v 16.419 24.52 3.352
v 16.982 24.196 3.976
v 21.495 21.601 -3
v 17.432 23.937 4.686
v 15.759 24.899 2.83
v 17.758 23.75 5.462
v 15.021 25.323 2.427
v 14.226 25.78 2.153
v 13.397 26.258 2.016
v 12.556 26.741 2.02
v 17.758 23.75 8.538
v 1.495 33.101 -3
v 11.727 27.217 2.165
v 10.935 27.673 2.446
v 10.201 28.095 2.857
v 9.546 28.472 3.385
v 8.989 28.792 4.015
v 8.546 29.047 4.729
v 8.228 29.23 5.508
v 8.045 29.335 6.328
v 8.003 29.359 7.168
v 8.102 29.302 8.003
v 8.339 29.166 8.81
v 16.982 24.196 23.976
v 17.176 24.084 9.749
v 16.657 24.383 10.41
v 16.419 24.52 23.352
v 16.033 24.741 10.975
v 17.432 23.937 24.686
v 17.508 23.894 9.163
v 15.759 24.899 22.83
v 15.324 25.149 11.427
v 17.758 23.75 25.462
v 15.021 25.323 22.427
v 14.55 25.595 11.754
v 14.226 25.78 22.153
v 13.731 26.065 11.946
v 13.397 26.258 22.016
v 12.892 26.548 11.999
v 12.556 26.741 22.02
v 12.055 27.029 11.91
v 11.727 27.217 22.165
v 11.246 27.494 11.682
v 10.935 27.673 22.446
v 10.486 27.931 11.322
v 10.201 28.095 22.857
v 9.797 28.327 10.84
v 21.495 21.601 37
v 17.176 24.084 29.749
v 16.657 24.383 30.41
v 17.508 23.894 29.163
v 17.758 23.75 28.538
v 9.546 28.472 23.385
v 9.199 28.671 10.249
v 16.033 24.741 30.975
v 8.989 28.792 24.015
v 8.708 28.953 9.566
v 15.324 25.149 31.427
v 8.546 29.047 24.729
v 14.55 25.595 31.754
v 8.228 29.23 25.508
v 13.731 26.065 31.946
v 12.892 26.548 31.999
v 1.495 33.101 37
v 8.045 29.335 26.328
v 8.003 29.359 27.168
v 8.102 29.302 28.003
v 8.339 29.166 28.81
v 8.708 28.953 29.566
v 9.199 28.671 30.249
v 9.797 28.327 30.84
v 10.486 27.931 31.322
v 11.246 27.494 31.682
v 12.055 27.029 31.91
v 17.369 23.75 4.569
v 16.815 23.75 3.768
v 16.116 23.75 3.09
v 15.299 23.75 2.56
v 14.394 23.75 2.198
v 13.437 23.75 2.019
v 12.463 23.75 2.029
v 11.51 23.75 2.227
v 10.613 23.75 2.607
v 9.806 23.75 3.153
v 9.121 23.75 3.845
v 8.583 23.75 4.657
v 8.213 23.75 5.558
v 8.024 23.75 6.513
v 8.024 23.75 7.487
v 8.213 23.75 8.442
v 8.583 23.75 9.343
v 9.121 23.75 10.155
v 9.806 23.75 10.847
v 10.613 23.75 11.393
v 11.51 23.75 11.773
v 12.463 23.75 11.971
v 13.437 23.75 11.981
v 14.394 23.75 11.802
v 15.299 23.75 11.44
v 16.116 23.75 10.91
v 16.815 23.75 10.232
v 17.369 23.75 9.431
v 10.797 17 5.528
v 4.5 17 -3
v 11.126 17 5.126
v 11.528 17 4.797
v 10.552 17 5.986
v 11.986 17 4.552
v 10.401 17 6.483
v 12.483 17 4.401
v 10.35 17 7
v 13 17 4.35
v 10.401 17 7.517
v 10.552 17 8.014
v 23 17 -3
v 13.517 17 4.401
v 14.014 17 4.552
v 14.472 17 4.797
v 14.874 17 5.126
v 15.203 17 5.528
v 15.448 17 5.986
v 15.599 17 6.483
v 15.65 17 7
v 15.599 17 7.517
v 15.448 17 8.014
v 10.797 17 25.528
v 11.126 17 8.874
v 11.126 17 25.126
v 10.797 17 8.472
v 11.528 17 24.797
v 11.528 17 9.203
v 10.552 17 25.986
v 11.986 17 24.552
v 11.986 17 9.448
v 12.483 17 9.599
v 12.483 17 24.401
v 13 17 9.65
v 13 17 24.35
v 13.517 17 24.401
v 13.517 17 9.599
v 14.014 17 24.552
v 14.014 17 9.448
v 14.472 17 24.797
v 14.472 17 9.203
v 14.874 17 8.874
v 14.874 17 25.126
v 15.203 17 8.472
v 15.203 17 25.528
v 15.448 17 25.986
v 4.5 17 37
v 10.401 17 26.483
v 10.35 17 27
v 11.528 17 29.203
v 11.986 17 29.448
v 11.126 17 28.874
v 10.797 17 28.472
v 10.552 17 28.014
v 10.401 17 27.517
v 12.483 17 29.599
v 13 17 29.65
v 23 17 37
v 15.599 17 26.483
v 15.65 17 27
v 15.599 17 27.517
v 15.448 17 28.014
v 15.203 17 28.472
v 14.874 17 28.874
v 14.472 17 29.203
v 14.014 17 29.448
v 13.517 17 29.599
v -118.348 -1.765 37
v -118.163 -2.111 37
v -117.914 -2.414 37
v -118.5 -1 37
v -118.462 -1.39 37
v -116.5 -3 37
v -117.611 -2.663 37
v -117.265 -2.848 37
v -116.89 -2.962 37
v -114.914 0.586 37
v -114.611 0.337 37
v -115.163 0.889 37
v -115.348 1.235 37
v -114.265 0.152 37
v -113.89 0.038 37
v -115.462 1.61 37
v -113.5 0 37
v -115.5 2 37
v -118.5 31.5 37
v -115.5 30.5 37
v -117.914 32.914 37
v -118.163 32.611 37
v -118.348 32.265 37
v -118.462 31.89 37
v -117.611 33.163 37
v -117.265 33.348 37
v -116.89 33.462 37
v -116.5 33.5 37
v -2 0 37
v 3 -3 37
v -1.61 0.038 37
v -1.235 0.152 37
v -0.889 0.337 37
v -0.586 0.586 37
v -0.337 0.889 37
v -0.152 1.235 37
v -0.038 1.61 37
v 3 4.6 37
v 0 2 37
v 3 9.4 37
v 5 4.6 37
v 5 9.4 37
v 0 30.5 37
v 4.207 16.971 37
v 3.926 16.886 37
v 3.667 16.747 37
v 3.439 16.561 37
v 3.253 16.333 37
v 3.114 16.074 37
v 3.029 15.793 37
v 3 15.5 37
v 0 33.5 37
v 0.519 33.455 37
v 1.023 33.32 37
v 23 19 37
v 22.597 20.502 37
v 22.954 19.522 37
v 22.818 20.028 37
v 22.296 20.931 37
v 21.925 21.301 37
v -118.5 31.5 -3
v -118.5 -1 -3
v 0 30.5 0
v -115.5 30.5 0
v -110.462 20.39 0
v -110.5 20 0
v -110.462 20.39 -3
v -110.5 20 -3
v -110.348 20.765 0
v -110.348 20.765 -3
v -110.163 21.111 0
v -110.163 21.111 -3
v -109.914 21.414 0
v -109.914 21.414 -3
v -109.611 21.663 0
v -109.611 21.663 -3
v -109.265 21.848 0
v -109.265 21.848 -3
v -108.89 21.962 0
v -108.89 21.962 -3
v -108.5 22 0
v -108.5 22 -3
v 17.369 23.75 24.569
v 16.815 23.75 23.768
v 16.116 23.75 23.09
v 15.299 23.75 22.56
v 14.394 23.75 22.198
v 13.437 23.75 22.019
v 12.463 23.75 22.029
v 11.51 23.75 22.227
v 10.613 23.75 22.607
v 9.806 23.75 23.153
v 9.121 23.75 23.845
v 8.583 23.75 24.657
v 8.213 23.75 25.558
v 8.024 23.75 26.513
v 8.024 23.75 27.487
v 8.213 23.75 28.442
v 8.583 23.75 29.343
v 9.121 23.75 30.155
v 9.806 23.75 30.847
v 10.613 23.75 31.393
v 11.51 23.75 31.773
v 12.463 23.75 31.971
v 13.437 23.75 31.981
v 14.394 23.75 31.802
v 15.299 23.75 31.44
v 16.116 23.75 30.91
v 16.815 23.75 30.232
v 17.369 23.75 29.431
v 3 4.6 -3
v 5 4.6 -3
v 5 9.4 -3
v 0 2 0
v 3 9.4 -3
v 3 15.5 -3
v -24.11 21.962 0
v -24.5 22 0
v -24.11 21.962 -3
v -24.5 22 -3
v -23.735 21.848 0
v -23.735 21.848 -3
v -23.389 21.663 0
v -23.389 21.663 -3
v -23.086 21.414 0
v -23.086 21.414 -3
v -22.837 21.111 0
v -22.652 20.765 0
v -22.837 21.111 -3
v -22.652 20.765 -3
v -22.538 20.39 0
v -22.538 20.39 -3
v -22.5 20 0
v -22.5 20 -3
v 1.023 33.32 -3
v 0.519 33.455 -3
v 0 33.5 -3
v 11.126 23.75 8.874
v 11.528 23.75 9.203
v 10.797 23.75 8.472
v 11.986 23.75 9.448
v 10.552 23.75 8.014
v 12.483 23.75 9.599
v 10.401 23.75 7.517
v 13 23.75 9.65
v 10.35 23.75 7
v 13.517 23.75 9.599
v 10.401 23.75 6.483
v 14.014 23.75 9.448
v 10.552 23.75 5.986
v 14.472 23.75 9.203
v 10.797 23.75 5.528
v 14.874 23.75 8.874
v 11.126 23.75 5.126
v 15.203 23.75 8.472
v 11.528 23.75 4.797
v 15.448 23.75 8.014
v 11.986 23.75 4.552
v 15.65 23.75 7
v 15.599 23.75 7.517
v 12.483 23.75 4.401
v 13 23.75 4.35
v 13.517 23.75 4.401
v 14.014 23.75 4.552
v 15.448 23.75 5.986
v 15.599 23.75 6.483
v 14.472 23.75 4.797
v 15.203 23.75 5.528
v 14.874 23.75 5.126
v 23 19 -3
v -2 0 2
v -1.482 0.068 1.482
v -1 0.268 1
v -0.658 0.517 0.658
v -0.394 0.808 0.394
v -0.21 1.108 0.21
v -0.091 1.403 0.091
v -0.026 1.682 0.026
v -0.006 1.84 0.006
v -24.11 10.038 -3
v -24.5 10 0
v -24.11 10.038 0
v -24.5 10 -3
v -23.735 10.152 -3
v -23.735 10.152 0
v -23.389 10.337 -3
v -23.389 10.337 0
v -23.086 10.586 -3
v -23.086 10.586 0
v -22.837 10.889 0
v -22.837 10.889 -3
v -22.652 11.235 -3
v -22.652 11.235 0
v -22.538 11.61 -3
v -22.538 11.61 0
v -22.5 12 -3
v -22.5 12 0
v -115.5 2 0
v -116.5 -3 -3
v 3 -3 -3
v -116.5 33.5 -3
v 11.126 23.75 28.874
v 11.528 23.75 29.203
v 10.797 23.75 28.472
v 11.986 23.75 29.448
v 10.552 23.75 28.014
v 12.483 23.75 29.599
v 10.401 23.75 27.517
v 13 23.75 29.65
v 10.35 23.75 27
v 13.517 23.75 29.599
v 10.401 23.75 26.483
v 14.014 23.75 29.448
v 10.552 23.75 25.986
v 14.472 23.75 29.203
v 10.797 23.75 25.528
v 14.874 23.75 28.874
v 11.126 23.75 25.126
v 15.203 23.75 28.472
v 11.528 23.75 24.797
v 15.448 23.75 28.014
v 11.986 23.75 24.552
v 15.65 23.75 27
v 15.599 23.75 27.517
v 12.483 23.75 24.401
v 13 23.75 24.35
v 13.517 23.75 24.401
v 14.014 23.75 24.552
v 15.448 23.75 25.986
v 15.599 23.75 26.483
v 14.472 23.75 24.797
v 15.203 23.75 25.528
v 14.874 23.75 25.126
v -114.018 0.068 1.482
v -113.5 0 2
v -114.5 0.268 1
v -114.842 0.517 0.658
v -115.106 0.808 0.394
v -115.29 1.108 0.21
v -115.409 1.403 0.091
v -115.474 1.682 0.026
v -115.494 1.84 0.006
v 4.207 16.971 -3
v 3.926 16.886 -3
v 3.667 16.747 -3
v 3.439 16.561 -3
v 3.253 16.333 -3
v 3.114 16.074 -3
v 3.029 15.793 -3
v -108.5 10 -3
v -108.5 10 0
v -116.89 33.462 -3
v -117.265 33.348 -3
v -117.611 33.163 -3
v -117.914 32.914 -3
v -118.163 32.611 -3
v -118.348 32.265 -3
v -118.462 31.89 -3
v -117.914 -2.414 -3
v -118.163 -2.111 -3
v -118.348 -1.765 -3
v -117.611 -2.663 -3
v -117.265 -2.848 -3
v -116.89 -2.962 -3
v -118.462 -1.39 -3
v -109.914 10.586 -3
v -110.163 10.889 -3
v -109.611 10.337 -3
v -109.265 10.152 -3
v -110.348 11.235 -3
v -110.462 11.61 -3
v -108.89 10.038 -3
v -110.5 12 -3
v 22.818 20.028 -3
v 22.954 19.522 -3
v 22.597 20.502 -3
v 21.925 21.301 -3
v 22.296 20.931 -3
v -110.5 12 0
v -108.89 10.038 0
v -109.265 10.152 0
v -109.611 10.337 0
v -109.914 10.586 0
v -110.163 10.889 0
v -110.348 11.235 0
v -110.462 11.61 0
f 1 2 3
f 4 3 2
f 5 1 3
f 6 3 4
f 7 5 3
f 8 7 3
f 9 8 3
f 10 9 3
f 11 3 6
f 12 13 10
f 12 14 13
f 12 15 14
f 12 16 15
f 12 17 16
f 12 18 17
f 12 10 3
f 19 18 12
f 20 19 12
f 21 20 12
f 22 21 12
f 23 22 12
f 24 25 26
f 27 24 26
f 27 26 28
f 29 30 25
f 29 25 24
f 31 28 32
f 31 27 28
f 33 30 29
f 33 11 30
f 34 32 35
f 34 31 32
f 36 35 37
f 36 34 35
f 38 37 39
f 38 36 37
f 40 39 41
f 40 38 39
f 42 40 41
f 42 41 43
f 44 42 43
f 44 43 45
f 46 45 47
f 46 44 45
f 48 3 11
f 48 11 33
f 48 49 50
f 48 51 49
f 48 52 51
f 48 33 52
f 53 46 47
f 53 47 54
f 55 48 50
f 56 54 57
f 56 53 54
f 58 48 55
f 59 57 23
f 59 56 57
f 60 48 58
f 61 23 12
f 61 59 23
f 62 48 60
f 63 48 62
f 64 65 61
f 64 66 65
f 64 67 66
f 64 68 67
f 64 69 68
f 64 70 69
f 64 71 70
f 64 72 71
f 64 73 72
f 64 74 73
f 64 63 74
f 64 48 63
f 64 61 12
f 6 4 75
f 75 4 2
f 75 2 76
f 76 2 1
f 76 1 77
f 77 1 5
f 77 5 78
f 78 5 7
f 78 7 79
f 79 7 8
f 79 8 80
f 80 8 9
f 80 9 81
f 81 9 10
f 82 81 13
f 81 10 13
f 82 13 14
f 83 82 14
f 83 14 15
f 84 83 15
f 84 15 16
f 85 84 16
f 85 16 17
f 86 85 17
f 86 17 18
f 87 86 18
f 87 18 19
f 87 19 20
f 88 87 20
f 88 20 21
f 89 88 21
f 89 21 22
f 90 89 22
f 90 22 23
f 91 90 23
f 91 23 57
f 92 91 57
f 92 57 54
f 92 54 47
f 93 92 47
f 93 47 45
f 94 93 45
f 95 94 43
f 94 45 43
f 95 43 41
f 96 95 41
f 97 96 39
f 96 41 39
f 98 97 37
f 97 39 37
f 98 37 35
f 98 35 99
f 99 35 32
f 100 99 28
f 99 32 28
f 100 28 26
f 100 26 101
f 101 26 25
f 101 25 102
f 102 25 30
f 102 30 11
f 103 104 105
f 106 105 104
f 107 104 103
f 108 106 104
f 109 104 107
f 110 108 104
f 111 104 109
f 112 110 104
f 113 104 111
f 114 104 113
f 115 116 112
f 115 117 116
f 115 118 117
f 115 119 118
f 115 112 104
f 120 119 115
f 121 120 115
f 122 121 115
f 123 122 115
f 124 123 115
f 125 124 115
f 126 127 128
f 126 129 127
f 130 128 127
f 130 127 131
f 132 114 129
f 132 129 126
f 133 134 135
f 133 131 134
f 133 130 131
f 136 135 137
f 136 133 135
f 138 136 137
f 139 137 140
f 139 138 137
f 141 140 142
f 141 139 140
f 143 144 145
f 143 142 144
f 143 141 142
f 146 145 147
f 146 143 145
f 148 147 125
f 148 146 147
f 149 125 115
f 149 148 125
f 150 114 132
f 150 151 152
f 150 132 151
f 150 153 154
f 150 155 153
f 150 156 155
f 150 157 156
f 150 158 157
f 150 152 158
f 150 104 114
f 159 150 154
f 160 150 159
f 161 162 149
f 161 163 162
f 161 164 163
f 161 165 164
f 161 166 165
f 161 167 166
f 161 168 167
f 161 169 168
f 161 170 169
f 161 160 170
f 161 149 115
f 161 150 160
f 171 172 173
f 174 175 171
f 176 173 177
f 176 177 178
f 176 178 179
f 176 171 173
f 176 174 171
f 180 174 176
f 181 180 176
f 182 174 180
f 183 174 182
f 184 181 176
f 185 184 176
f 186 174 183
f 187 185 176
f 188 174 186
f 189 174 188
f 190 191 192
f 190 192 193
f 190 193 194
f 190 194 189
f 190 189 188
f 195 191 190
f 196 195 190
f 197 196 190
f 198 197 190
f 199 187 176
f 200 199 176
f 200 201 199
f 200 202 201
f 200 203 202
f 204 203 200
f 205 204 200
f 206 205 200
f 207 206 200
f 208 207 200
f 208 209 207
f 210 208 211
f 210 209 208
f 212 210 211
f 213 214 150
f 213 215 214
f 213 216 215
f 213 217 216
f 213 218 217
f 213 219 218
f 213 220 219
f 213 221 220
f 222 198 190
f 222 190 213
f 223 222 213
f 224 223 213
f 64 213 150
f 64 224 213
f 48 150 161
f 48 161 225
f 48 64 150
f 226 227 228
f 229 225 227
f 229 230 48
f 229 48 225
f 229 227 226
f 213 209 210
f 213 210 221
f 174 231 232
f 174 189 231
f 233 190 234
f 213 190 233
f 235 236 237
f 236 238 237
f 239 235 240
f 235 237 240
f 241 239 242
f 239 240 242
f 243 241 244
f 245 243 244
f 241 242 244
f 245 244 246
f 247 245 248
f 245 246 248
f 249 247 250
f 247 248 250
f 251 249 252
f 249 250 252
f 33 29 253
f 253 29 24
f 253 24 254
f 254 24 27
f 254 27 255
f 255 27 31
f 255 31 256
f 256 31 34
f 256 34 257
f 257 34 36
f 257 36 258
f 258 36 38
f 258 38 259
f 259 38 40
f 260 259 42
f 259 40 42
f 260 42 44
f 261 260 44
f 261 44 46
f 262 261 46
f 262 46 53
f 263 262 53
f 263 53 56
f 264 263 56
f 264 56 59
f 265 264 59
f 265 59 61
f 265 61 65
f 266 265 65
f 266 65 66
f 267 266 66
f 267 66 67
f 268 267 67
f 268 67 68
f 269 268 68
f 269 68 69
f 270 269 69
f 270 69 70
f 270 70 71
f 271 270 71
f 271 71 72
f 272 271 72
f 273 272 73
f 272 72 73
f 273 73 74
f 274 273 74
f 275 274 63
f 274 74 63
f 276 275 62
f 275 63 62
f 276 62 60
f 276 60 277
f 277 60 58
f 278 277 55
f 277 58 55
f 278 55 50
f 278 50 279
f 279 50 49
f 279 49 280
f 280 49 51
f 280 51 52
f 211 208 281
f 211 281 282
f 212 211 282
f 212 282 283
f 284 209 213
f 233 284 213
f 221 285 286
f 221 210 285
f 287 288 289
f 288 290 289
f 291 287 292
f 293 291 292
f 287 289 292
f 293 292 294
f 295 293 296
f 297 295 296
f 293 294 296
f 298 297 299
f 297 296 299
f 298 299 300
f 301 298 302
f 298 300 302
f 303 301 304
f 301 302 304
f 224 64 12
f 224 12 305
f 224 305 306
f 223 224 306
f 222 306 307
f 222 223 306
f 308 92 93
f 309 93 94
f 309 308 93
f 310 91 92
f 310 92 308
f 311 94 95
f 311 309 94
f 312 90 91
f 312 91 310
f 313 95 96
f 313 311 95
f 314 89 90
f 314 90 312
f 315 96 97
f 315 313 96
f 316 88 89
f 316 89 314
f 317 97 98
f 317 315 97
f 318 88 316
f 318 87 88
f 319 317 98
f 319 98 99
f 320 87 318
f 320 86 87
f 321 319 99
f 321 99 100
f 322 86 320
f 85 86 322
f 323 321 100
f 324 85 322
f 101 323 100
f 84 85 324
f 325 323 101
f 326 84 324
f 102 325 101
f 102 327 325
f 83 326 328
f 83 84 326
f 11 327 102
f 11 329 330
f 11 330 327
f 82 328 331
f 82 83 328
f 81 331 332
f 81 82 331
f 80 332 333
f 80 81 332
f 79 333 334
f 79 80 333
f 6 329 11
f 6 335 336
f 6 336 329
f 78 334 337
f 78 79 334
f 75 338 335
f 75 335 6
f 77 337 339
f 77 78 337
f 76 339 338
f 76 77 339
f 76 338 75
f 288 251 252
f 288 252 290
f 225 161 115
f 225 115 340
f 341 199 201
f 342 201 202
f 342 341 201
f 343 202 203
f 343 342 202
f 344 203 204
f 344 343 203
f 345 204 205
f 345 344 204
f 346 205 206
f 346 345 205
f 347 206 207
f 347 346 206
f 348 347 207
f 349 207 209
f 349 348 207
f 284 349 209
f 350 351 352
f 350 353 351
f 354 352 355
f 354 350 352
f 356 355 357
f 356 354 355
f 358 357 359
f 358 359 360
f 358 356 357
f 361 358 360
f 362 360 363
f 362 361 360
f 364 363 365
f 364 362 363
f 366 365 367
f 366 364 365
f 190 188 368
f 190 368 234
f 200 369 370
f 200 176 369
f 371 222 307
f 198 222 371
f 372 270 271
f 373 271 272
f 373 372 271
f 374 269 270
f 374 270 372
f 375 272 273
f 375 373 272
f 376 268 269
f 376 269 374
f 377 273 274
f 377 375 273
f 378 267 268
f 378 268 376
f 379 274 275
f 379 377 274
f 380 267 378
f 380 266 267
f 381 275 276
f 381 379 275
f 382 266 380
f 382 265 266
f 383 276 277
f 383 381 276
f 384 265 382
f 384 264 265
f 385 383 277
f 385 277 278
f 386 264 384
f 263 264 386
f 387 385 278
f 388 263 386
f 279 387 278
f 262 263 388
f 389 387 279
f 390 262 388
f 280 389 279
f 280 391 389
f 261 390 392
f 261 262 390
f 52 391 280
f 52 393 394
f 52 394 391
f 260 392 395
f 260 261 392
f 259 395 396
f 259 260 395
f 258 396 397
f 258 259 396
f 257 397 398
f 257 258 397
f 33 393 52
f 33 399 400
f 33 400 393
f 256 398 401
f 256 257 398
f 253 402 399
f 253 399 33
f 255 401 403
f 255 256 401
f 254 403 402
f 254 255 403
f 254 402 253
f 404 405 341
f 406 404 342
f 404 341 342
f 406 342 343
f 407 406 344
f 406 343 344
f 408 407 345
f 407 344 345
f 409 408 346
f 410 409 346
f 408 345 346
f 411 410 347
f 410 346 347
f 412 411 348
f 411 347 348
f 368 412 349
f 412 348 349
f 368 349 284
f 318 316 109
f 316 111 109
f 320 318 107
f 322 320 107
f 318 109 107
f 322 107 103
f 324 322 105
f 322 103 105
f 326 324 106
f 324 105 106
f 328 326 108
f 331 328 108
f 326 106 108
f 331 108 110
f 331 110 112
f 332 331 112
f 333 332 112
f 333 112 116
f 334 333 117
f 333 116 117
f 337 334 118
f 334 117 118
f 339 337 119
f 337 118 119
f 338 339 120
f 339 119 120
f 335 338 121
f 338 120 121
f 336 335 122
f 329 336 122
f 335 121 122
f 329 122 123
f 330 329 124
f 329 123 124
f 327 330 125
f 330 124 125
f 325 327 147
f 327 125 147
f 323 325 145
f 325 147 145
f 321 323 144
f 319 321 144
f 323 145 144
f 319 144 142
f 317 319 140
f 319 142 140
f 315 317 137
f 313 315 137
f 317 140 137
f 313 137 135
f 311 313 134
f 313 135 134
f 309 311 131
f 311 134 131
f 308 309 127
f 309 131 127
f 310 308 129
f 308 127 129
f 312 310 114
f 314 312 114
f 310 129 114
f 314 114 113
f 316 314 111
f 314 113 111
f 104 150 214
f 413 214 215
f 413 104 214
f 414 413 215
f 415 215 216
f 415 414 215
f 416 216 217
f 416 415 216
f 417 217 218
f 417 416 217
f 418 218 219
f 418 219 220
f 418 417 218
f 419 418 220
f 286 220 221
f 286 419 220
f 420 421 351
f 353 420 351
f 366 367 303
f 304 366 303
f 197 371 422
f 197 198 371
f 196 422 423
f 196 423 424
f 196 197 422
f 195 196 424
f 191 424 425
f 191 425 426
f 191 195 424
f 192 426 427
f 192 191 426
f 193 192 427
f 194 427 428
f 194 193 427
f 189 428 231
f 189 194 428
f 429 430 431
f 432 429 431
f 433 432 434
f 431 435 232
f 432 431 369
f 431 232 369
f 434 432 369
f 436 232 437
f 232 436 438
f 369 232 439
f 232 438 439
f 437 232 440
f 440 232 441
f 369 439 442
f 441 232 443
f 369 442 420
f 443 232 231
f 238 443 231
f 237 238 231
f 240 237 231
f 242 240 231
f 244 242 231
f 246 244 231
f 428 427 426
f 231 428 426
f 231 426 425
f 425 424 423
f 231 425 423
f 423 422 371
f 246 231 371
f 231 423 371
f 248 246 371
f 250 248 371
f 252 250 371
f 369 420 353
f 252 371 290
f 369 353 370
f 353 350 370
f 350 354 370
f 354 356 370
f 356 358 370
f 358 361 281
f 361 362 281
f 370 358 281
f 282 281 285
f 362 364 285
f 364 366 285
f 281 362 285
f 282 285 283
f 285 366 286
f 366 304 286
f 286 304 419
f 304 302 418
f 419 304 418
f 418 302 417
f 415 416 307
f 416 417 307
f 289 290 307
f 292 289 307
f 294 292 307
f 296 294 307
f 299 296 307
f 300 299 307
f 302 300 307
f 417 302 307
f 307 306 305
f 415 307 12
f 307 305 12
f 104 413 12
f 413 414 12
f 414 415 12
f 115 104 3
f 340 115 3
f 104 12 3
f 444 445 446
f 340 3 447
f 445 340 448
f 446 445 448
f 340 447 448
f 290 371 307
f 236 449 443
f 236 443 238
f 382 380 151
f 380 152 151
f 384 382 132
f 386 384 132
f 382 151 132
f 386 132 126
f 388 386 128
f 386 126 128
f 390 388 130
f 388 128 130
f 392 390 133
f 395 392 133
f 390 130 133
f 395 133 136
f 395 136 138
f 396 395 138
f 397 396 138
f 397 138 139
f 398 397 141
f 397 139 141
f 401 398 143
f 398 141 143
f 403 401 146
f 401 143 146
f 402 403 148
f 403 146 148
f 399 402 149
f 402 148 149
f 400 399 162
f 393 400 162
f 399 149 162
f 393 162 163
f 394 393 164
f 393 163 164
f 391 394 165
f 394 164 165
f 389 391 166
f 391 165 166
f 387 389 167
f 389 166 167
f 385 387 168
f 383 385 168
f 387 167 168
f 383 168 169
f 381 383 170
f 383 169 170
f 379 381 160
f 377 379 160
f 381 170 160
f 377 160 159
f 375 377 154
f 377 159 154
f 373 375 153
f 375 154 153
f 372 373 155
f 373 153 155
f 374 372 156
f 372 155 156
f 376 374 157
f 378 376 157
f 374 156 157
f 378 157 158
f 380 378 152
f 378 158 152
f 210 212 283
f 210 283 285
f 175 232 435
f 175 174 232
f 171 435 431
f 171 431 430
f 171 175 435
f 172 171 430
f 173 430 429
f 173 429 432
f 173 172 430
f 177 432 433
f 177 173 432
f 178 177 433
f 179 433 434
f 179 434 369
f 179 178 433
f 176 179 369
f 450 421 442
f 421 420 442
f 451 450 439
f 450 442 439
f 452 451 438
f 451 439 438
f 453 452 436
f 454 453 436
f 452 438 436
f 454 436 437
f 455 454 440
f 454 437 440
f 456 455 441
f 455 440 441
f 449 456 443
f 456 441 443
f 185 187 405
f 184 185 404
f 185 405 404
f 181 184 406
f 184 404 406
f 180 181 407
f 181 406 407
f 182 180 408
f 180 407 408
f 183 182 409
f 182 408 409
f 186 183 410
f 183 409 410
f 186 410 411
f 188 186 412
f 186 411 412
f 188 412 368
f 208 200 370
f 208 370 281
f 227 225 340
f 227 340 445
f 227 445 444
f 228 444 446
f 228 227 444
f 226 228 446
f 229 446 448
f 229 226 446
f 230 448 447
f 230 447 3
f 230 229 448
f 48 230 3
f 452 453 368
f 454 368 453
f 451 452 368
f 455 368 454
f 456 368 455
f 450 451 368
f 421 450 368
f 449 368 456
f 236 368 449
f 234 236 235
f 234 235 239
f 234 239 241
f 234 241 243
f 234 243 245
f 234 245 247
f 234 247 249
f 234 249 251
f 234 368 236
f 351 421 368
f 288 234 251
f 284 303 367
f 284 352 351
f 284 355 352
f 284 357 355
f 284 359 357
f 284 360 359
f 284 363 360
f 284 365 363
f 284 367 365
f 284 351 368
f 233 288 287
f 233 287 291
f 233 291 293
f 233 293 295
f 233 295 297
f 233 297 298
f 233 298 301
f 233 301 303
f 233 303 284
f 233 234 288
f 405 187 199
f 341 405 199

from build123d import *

# Parameters (mm, degrees)
SKETCH1_W                      = 115.5
SKETCH1_H                      = 30.5
SKETCH1_W_2                    = 88
SKETCH1_H_2                    = 12
BOSS_EXTRUDE1_DEPTH            = 3
BOSS_EXTRUDE2_START            = 37
SKETCH1_3_W                    = 115.5
SKETCH1_3_H                    = 30.5
BOSS_EXTRUDE2_DEPTH            = 37
CBORE_FOR_M5_SHCS1_D           = 5.3
CBORE_FOR_M5_SHCS1_CBORE_D     = 10
CBORE_FOR_M5_SHCS1_CBORE_DEPTH = 9.75
FILLET1_R                      = 2
FILLET2_R                      = 1.5


with BuildPart() as part:
    # Sketch1 → Boss-Extrude1 (new body)
    # profile 1 of 2: a face of its own
    with BuildSketch(Plane.XY):
        with BuildLine():
            Line((23, 17), (23, 19))
            ThreePointArc((23, 19), (22.596751829, 20.502291563), (21.495413373, 21.600718909))
            Line((21.495413373, 21.600718909), (1.495413373, 33.100718909))
            ThreePointArc((1.495413373, 33.100718909), (0.773900275, 33.398461379), (0, 33.5))
            Line((0, 33.5), (-118.5, 33.5))
            Line((-118.5, 33.5), (-118.5, -3))
            Line((-118.5, -3), (3, -3))
            Line((3, -3), (3, 4.6))
            Line((3, 4.6), (5, 4.6))
            Line((5, 4.6), (5, 9.4))
            Line((5, 9.4), (3, 9.4))
            Line((3, 9.4), (3, 17))
            Line((3, 17), (23, 17))
        make_face()
        with Locations((-57.75, 15.25)):
            Rectangle(SKETCH1_W, SKETCH1_H, mode=Mode.SUBTRACT)
    # profile 2 of 2: a face of its own
    with BuildSketch(Plane.XY):
        with Locations((-57.75, 15.25)):
            Rectangle(SKETCH1_W, SKETCH1_H)
        with Locations((-66.5, 16)):
            Rectangle(SKETCH1_W_2, SKETCH1_H_2, mode=Mode.SUBTRACT)
    extrude(amount=-BOSS_EXTRUDE1_DEPTH)

    # Sketch1<3> → Boss-Extrude2 (add)
    with BuildSketch(Plane.XY.offset(BOSS_EXTRUDE2_START)):
        with BuildLine():
            Line((23, 17), (23, 19))
            ThreePointArc((23, 19), (22.596751829, 20.502291563), (21.495413373, 21.600718909))
            Line((21.495413373, 21.600718909), (1.495413373, 33.100718909))
            ThreePointArc((1.495413373, 33.100718909), (0.773900275, 33.398461379), (0, 33.5))
            Line((0, 33.5), (-118.5, 33.5))
            Line((-118.5, 33.5), (-118.5, -3))
            Line((-118.5, -3), (3, -3))
            Line((3, -3), (3, 4.6))
            Line((3, 4.6), (5, 4.6))
            Line((5, 4.6), (5, 9.4))
            Line((5, 9.4), (3, 9.4))
            Line((3, 9.4), (3, 17))
            Line((3, 17), (23, 17))
        make_face()
        with Locations((-57.75, 15.25)):
            Rectangle(SKETCH1_3_W, SKETCH1_3_H, mode=Mode.SUBTRACT)
    extrude(amount=-BOSS_EXTRUDE2_DEPTH)

    # CBORE for M5 SHCS1 (through all)
    with Locations(Plane(origin=(0, 33.5, 0), x_dir=(1, 0, 0), z_dir=(0, 1, 0))):
        with Locations((13, -27), (13, -7)):
            CounterBoreHole(CBORE_FOR_M5_SHCS1_D / 2, CBORE_FOR_M5_SHCS1_CBORE_D / 2, CBORE_FOR_M5_SHCS1_CBORE_DEPTH)

    # Fillet1
    fillet1_edges = [part.edges().sort_by_distance(p)[0] for p in [
        (-22.5, 22, -1.5),
        (-110.5, 22, -1.5),
        (-110.5, 10, -1.5),
        (-22.5, 10, -1.5),
        (-118.5, -3, 17),
        (-118.5, 33.5, 17),
        (0, 0, 18.5),
        (-57.75, 0, 0),
        (-115.5, 0, 18.5),
    ]]
    fillet(fillet1_edges, radius=FILLET1_R)

    # Fillet2
    fillet2_edges = [part.edges().sort_by_distance(p)[0] for p in [
        (3, 17, 17),
    ]]
    fillet(fillet2_edges, radius=FILLET2_R)


solid = part.part
